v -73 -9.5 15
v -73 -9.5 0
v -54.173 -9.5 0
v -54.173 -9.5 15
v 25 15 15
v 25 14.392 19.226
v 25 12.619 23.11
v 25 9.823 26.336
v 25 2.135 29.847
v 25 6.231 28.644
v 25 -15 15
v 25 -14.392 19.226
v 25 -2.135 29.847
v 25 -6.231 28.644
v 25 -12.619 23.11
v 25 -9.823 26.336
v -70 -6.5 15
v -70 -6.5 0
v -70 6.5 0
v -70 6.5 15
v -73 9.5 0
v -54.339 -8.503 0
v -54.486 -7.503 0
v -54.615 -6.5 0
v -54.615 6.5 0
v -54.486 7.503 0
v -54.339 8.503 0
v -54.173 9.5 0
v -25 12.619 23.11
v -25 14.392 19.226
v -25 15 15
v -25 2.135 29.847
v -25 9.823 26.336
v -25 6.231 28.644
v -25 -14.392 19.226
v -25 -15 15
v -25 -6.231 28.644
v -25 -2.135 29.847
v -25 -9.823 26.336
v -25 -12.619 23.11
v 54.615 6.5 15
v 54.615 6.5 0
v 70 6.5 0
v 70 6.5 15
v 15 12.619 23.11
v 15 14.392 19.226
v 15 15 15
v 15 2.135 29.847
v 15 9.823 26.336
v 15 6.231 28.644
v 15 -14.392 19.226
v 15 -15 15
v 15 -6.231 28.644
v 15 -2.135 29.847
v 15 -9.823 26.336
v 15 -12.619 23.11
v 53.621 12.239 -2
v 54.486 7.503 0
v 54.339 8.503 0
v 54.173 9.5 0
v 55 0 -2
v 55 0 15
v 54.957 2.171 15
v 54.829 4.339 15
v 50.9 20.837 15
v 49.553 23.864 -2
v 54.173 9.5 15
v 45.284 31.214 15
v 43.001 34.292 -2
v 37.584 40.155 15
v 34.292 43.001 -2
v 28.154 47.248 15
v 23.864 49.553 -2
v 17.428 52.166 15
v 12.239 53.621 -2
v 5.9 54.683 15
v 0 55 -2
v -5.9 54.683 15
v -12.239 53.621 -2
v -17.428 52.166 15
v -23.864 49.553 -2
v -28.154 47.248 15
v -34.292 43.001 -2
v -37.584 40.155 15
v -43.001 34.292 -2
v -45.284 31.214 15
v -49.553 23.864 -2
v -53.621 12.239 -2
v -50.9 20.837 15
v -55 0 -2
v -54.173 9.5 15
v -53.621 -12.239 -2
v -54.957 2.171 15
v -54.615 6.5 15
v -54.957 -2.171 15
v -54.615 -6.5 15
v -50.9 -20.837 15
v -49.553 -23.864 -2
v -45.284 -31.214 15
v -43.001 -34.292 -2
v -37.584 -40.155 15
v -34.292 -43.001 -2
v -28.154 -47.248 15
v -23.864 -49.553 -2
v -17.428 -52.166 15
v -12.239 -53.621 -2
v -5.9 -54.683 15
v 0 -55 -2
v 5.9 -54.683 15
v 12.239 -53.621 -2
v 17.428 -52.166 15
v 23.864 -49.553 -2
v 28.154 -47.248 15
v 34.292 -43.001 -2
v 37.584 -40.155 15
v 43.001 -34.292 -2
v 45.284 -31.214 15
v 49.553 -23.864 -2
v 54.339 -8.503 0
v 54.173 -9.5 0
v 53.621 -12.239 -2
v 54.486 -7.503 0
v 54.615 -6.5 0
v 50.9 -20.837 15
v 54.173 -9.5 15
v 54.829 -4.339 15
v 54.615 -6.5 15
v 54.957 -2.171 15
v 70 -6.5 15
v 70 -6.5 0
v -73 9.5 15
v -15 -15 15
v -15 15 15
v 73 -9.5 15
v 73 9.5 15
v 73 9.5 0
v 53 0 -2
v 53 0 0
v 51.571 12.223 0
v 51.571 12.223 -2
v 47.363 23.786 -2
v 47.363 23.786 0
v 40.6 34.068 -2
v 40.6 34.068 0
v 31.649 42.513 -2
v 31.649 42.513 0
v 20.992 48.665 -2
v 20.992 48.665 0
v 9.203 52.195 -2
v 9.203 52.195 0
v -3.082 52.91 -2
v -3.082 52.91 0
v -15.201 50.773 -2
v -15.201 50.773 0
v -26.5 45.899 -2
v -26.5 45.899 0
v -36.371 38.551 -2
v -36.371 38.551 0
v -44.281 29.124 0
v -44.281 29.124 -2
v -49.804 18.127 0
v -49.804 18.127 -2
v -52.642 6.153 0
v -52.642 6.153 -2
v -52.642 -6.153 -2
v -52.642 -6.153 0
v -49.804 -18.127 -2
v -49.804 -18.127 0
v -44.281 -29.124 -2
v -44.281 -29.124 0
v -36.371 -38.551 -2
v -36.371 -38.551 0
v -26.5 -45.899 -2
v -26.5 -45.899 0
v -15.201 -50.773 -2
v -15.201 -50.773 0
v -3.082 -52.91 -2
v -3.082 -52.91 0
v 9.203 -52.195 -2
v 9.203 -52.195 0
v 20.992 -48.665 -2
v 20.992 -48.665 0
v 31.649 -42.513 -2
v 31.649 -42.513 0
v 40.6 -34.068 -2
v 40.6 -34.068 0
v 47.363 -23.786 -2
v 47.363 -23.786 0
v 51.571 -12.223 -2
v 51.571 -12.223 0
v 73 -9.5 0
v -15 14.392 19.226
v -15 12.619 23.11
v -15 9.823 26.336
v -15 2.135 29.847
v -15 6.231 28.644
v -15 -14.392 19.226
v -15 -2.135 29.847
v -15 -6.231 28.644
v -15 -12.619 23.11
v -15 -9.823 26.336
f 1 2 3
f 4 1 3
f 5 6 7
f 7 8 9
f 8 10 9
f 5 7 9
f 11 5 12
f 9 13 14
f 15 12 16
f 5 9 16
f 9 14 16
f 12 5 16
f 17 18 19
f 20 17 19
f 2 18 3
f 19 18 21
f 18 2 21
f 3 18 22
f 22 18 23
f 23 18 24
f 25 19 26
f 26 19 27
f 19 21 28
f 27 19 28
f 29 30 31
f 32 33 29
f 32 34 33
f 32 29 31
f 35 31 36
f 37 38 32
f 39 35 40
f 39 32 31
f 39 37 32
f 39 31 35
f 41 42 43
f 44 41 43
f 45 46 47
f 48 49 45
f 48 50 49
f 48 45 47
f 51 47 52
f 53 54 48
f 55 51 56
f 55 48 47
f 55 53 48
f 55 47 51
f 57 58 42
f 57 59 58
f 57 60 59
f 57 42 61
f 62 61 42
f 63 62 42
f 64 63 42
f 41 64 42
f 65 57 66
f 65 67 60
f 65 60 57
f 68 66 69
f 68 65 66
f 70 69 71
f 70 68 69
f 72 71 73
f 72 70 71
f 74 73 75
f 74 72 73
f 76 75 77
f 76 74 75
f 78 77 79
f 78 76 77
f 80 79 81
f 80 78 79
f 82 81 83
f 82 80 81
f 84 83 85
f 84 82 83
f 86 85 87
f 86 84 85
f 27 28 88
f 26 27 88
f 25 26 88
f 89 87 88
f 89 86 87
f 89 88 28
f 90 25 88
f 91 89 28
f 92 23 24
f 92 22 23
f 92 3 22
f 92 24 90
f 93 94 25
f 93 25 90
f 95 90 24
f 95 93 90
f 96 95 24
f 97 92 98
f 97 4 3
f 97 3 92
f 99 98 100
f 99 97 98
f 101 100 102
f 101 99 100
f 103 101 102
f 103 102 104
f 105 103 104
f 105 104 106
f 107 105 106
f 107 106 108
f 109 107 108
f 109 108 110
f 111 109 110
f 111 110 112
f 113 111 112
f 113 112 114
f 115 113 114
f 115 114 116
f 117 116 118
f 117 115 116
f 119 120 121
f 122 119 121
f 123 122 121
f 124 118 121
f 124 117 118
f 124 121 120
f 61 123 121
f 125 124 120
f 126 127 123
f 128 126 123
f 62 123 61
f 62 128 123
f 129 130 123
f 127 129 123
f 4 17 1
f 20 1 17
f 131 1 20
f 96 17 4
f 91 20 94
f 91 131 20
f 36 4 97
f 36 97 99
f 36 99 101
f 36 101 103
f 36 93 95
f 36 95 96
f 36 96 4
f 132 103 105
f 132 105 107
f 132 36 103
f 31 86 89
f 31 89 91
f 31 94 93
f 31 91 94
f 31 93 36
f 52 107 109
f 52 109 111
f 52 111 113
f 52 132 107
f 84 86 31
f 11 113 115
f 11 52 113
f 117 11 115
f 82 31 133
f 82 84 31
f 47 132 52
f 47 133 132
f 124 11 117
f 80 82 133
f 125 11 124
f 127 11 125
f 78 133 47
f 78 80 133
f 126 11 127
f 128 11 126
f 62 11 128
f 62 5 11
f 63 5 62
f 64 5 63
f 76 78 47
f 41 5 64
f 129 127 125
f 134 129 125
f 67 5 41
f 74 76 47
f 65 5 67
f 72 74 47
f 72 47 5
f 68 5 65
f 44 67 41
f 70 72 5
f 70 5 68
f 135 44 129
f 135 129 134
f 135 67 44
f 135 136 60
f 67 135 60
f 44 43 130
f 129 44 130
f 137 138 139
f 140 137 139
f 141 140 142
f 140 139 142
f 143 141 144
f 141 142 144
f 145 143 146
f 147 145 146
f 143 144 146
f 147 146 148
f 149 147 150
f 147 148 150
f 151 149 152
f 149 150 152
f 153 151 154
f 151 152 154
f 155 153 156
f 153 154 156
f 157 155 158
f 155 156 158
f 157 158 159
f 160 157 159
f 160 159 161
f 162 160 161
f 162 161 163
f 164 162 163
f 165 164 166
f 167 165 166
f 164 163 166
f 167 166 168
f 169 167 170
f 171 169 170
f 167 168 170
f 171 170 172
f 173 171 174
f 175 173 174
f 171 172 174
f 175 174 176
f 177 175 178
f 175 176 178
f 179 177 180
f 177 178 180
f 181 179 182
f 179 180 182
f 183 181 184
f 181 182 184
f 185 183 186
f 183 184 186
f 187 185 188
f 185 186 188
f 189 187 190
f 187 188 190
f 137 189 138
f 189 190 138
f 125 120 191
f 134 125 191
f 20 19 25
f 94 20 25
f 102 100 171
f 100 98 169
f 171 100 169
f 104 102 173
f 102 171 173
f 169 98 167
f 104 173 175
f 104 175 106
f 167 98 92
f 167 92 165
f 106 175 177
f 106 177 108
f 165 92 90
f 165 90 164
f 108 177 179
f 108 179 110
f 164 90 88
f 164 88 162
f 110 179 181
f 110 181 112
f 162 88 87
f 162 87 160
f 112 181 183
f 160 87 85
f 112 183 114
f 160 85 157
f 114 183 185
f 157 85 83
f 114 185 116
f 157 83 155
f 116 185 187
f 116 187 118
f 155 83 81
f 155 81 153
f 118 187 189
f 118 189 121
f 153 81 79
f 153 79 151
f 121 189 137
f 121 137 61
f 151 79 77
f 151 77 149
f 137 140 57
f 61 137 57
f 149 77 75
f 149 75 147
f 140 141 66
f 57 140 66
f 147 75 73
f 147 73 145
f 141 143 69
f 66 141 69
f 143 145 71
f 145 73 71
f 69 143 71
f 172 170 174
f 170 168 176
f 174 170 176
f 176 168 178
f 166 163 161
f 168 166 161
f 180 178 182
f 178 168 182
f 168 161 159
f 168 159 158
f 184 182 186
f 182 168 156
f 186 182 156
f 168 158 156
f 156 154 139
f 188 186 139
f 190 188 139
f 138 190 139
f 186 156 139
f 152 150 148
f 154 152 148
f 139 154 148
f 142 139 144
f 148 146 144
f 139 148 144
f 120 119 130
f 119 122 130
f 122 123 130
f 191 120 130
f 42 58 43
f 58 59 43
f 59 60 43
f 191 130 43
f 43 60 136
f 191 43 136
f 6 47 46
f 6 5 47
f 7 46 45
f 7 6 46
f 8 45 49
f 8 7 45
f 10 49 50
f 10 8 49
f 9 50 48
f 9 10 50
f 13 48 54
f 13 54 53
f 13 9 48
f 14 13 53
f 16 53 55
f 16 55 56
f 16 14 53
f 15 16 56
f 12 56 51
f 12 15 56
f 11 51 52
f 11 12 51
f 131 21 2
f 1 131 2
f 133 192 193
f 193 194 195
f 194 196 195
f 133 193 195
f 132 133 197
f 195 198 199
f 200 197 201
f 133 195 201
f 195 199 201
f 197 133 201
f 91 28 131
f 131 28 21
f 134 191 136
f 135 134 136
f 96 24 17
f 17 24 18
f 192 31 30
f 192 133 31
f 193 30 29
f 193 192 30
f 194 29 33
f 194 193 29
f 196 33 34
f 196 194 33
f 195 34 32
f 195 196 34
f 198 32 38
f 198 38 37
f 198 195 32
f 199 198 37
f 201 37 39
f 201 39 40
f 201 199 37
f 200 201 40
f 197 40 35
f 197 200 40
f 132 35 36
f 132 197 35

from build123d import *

# Parameters (mm, degrees)
F0_R     = 55
F0_R_2   = 53
F1_DEPTH = 15
F2_R     = 55
F2_R_2   = 53
F3_DEPTH = 2
F4_W     = 10
F4_H     = 15
F5_ANGLE = 180
F7_DEPTH = 15


with BuildPart() as f1:
    # F0 (on Top) → F1 (new body)
    with BuildSketch(Plane.XY):
        Circle(F0_R)
        Circle(F0_R_2, mode=Mode.SUBTRACT)
        Circle(F0_R_2)
    extrude(amount=F1_DEPTH)

    # F2 (on Top) → F3 (join)
    with BuildSketch(Plane.XY):
        Circle(F2_R)
        Circle(F2_R_2, mode=Mode.SUBTRACT)
    extrude(amount=-F3_DEPTH)

    # F4 (on face) → F5 (revolve)
    with BuildSketch(Plane.XY.offset(15)):
        with Locations((-20, 7.5)):
            Rectangle(F4_W, F4_H)
        with Locations((20, 7.5)):
            Rectangle(F4_W, F4_H)
    revolve(axis=Axis((3.316946, 0, 15), (1, 0, 0)), revolution_arc=F5_ANGLE)

    # F6 (on Top) → F7 (join)
    with BuildSketch(Plane.XY):
        Polygon((-70, 6.5), (-53.270391, 6.5), (-52.225381, 9.5), (-73, 9.5), (-73, 0), (-73, -9.5), (-52.225381, -9.5), (-53.270391, -6.5), (-70, -6.5), (-70, 0), align=None)
        Polygon((73, 9.5), (52.225381, 9.5), (53.270391, 6.5), (70, 6.5), (70, 0), (70, -6.5), (53.270391, -6.5), (52.225381, -9.5), (73, -9.5), (73, 0), align=None)
    extrude(amount=F7_DEPTH)


solid = f1.part
